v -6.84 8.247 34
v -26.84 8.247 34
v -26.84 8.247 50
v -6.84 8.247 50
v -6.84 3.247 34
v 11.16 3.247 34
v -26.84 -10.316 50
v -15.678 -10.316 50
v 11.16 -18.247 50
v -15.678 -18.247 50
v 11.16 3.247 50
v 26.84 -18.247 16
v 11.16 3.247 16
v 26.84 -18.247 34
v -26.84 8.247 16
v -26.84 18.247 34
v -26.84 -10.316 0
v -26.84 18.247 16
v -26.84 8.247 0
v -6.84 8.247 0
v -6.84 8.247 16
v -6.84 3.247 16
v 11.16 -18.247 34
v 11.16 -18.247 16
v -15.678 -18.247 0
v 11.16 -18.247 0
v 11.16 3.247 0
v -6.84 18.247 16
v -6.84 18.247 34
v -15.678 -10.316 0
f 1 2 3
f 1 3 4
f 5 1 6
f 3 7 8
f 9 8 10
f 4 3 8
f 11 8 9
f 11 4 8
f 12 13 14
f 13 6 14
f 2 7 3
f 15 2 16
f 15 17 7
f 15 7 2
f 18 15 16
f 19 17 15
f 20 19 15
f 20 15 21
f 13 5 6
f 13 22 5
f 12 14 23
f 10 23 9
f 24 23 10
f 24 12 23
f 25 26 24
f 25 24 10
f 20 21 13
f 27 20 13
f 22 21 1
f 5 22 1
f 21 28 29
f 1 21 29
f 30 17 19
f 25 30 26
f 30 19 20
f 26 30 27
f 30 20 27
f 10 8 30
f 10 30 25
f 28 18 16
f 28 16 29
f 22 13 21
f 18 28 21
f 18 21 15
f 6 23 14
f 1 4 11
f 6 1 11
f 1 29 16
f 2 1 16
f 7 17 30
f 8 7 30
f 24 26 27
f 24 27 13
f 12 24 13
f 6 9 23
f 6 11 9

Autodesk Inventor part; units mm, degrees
ref_plane "YZ Plane" through (0, 0, 0) normal (1, 0, 0) x (0, 1, 0)
ref_plane "XZ Plane" through (0, 0, 0) normal (0, 1, 0) x (-1, 0, 0)
ref_plane "XY Plane" through (0, 0, 0) normal (0, 0, 1) x (1, 0, 0)
sketch "스케치1" plane through (0, 0, 0) normal (0, 0, 1) x (1, 0, 0)
  line L0 (26.8403, -18.2471) -> (-26.8403, -18.2471)
  line L1 (-26.8403, -18.2471) -> (-26.8403, 18.2471)
  line L2 (-26.8403, 18.2471) -> (26.8403, 18.2471)
  line L3 (26.8403, 18.2471) -> (26.8403, -18.2471)
  line L4 (26.8403, -18.2471) -> (-26.8403, 18.2471) construction
  line L5 (-26.8403, -18.2471) -> (26.8403, 18.2471) construction
  point P0 (0, 0)
extrude "돌출1" add sketch "스케치1" along normal blind 50
sketch "스케치2" plane through (-26.8403, 18.2471, 0) normal (0, 1, 0) x (1, 0, 0)
  line L0 (0, -50) -> (53.6805, -50) projected
  line L1 (0, -50) -> (20, -50)
  line L2 (20, -50) -> (20, -34)
  line L3 (20, -34) -> (0, -34)
  line L4 (0, -34) -> (0, -50)
  line L5 (0, 0) -> (20, 0)
  line L6 (20, 0) -> (20, -16)
  line L7 (20, -16) -> (0, -16)
  line L8 (0, -16) -> (0, 0)
  line L9 (20, -34) -> (38, -34)
  line L10 (38, -34) -> (38, -16)
  line L11 (38, -16) -> (20, -16)
  line L12 (20, -16) -> (20, -34)
  line L13 (38, -34) -> (53.6805, -34)
  line L14 (53.6805, -34) -> (53.6805, -50)
  line L15 (53.6805, -50) -> (38, -50)
  line L16 (38, -50) -> (38, -34)
  line L17 (53.6805, 0) -> (53.6805, -50) projected
  line L18 (38, -16) -> (53.6805, -16)
  line L19 (53.6805, -16) -> (53.6805, 0)
  line L20 (53.6805, 0) -> (38, 0)
  line L21 (38, 0) -> (38, -16)
  point P0 (26.8403, 0)
  dimension "d2" = 20
  dimension "d3" = 16
  dimension "d4" = 20
  dimension "d5" = 16
  dimension "d6" = 18
extrude "돌출2" cut sketch "스케치2" against normal blind 10 contours L4 L3 L2 L0 | L7 L8 L5 L6
extrude "돌출3" cut sketch "스케치2" against normal blind 15 contours L12 L11 L10 L9
extrude "돌출4" cut sketch "스케치2" against normal blind 50 contours L16 L13 L14 L0 | L21 L20 L17 L18
sketch "스케치3" plane through (11.1597, 18.2471, 34) normal (0, 0, 1) x (1, 0, 0)
  line L0 (15.6805, -36.4941) -> (15.6805, 0) projected
  line L1 (0, -15) -> (15.6805, -36.4941)
  line L2 (15.6805, -36.4941) -> (15.6805, 0)
  line L3 (0, -36.4941) -> (0, 0) projected
  line L4 (15.6805, 0) -> (0, 0)
  line L5 (0, 0) -> (0, -15)
  point P0 (-11.1597, -18.2471)
extrude "돌출5" cut sketch "스케치3" against normal blind 50
sketch "스케치4" plane through (0, 0, 50) normal (0, 0, 1) x (1, 0, 0)
  line L0 (-6.8403, 8.2471) -> (-6.8403, 18.2471) projected
  line L1 (-6.8403, 3.2471) -> (11.1597, 3.2471) projected
  line L2 (-6.8403, 8.2471) -> (11.1597, 3.2471)
  line L3 (11.1597, 18.2471) -> (-6.8403, 18.2471) projected
  line L4 (11.1597, 3.2471) -> (11.1597, 18.2471)
  line L5 (11.1597, 18.2471) -> (-6.8403, 18.2471)
  line L6 (-6.8403, 18.2471) -> (-6.8403, 8.2471)
  point P0 (0, 0)
extrude "돌출6" cut sketch "스케치4" against normal blind 50
sketch "스케치5" plane through (0, 0, 50) normal (0, 0, 1) x (1, 0, 0)
  line L0 (-26.8403, 8.2471) -> (-26.8403, -18.2471) projected
  line L1 (-26.8403, -18.2471) -> (11.1597, -18.2471) projected
  line L2 (-26.8403, -10.3165) -> (-15.6784, -10.3165)
  line L3 (-15.6784, -10.3165) -> (-15.6784, -18.2471)
  line L4 (-15.6784, -18.2471) -> (-26.8403, -18.2471)
  line L5 (-26.8403, -18.2471) -> (-26.8403, -10.3165)
  point P0 (0, 0)
extrude "돌출7" cut sketch "스케치5" against normal blind 50
properties part number "240628_final1"
